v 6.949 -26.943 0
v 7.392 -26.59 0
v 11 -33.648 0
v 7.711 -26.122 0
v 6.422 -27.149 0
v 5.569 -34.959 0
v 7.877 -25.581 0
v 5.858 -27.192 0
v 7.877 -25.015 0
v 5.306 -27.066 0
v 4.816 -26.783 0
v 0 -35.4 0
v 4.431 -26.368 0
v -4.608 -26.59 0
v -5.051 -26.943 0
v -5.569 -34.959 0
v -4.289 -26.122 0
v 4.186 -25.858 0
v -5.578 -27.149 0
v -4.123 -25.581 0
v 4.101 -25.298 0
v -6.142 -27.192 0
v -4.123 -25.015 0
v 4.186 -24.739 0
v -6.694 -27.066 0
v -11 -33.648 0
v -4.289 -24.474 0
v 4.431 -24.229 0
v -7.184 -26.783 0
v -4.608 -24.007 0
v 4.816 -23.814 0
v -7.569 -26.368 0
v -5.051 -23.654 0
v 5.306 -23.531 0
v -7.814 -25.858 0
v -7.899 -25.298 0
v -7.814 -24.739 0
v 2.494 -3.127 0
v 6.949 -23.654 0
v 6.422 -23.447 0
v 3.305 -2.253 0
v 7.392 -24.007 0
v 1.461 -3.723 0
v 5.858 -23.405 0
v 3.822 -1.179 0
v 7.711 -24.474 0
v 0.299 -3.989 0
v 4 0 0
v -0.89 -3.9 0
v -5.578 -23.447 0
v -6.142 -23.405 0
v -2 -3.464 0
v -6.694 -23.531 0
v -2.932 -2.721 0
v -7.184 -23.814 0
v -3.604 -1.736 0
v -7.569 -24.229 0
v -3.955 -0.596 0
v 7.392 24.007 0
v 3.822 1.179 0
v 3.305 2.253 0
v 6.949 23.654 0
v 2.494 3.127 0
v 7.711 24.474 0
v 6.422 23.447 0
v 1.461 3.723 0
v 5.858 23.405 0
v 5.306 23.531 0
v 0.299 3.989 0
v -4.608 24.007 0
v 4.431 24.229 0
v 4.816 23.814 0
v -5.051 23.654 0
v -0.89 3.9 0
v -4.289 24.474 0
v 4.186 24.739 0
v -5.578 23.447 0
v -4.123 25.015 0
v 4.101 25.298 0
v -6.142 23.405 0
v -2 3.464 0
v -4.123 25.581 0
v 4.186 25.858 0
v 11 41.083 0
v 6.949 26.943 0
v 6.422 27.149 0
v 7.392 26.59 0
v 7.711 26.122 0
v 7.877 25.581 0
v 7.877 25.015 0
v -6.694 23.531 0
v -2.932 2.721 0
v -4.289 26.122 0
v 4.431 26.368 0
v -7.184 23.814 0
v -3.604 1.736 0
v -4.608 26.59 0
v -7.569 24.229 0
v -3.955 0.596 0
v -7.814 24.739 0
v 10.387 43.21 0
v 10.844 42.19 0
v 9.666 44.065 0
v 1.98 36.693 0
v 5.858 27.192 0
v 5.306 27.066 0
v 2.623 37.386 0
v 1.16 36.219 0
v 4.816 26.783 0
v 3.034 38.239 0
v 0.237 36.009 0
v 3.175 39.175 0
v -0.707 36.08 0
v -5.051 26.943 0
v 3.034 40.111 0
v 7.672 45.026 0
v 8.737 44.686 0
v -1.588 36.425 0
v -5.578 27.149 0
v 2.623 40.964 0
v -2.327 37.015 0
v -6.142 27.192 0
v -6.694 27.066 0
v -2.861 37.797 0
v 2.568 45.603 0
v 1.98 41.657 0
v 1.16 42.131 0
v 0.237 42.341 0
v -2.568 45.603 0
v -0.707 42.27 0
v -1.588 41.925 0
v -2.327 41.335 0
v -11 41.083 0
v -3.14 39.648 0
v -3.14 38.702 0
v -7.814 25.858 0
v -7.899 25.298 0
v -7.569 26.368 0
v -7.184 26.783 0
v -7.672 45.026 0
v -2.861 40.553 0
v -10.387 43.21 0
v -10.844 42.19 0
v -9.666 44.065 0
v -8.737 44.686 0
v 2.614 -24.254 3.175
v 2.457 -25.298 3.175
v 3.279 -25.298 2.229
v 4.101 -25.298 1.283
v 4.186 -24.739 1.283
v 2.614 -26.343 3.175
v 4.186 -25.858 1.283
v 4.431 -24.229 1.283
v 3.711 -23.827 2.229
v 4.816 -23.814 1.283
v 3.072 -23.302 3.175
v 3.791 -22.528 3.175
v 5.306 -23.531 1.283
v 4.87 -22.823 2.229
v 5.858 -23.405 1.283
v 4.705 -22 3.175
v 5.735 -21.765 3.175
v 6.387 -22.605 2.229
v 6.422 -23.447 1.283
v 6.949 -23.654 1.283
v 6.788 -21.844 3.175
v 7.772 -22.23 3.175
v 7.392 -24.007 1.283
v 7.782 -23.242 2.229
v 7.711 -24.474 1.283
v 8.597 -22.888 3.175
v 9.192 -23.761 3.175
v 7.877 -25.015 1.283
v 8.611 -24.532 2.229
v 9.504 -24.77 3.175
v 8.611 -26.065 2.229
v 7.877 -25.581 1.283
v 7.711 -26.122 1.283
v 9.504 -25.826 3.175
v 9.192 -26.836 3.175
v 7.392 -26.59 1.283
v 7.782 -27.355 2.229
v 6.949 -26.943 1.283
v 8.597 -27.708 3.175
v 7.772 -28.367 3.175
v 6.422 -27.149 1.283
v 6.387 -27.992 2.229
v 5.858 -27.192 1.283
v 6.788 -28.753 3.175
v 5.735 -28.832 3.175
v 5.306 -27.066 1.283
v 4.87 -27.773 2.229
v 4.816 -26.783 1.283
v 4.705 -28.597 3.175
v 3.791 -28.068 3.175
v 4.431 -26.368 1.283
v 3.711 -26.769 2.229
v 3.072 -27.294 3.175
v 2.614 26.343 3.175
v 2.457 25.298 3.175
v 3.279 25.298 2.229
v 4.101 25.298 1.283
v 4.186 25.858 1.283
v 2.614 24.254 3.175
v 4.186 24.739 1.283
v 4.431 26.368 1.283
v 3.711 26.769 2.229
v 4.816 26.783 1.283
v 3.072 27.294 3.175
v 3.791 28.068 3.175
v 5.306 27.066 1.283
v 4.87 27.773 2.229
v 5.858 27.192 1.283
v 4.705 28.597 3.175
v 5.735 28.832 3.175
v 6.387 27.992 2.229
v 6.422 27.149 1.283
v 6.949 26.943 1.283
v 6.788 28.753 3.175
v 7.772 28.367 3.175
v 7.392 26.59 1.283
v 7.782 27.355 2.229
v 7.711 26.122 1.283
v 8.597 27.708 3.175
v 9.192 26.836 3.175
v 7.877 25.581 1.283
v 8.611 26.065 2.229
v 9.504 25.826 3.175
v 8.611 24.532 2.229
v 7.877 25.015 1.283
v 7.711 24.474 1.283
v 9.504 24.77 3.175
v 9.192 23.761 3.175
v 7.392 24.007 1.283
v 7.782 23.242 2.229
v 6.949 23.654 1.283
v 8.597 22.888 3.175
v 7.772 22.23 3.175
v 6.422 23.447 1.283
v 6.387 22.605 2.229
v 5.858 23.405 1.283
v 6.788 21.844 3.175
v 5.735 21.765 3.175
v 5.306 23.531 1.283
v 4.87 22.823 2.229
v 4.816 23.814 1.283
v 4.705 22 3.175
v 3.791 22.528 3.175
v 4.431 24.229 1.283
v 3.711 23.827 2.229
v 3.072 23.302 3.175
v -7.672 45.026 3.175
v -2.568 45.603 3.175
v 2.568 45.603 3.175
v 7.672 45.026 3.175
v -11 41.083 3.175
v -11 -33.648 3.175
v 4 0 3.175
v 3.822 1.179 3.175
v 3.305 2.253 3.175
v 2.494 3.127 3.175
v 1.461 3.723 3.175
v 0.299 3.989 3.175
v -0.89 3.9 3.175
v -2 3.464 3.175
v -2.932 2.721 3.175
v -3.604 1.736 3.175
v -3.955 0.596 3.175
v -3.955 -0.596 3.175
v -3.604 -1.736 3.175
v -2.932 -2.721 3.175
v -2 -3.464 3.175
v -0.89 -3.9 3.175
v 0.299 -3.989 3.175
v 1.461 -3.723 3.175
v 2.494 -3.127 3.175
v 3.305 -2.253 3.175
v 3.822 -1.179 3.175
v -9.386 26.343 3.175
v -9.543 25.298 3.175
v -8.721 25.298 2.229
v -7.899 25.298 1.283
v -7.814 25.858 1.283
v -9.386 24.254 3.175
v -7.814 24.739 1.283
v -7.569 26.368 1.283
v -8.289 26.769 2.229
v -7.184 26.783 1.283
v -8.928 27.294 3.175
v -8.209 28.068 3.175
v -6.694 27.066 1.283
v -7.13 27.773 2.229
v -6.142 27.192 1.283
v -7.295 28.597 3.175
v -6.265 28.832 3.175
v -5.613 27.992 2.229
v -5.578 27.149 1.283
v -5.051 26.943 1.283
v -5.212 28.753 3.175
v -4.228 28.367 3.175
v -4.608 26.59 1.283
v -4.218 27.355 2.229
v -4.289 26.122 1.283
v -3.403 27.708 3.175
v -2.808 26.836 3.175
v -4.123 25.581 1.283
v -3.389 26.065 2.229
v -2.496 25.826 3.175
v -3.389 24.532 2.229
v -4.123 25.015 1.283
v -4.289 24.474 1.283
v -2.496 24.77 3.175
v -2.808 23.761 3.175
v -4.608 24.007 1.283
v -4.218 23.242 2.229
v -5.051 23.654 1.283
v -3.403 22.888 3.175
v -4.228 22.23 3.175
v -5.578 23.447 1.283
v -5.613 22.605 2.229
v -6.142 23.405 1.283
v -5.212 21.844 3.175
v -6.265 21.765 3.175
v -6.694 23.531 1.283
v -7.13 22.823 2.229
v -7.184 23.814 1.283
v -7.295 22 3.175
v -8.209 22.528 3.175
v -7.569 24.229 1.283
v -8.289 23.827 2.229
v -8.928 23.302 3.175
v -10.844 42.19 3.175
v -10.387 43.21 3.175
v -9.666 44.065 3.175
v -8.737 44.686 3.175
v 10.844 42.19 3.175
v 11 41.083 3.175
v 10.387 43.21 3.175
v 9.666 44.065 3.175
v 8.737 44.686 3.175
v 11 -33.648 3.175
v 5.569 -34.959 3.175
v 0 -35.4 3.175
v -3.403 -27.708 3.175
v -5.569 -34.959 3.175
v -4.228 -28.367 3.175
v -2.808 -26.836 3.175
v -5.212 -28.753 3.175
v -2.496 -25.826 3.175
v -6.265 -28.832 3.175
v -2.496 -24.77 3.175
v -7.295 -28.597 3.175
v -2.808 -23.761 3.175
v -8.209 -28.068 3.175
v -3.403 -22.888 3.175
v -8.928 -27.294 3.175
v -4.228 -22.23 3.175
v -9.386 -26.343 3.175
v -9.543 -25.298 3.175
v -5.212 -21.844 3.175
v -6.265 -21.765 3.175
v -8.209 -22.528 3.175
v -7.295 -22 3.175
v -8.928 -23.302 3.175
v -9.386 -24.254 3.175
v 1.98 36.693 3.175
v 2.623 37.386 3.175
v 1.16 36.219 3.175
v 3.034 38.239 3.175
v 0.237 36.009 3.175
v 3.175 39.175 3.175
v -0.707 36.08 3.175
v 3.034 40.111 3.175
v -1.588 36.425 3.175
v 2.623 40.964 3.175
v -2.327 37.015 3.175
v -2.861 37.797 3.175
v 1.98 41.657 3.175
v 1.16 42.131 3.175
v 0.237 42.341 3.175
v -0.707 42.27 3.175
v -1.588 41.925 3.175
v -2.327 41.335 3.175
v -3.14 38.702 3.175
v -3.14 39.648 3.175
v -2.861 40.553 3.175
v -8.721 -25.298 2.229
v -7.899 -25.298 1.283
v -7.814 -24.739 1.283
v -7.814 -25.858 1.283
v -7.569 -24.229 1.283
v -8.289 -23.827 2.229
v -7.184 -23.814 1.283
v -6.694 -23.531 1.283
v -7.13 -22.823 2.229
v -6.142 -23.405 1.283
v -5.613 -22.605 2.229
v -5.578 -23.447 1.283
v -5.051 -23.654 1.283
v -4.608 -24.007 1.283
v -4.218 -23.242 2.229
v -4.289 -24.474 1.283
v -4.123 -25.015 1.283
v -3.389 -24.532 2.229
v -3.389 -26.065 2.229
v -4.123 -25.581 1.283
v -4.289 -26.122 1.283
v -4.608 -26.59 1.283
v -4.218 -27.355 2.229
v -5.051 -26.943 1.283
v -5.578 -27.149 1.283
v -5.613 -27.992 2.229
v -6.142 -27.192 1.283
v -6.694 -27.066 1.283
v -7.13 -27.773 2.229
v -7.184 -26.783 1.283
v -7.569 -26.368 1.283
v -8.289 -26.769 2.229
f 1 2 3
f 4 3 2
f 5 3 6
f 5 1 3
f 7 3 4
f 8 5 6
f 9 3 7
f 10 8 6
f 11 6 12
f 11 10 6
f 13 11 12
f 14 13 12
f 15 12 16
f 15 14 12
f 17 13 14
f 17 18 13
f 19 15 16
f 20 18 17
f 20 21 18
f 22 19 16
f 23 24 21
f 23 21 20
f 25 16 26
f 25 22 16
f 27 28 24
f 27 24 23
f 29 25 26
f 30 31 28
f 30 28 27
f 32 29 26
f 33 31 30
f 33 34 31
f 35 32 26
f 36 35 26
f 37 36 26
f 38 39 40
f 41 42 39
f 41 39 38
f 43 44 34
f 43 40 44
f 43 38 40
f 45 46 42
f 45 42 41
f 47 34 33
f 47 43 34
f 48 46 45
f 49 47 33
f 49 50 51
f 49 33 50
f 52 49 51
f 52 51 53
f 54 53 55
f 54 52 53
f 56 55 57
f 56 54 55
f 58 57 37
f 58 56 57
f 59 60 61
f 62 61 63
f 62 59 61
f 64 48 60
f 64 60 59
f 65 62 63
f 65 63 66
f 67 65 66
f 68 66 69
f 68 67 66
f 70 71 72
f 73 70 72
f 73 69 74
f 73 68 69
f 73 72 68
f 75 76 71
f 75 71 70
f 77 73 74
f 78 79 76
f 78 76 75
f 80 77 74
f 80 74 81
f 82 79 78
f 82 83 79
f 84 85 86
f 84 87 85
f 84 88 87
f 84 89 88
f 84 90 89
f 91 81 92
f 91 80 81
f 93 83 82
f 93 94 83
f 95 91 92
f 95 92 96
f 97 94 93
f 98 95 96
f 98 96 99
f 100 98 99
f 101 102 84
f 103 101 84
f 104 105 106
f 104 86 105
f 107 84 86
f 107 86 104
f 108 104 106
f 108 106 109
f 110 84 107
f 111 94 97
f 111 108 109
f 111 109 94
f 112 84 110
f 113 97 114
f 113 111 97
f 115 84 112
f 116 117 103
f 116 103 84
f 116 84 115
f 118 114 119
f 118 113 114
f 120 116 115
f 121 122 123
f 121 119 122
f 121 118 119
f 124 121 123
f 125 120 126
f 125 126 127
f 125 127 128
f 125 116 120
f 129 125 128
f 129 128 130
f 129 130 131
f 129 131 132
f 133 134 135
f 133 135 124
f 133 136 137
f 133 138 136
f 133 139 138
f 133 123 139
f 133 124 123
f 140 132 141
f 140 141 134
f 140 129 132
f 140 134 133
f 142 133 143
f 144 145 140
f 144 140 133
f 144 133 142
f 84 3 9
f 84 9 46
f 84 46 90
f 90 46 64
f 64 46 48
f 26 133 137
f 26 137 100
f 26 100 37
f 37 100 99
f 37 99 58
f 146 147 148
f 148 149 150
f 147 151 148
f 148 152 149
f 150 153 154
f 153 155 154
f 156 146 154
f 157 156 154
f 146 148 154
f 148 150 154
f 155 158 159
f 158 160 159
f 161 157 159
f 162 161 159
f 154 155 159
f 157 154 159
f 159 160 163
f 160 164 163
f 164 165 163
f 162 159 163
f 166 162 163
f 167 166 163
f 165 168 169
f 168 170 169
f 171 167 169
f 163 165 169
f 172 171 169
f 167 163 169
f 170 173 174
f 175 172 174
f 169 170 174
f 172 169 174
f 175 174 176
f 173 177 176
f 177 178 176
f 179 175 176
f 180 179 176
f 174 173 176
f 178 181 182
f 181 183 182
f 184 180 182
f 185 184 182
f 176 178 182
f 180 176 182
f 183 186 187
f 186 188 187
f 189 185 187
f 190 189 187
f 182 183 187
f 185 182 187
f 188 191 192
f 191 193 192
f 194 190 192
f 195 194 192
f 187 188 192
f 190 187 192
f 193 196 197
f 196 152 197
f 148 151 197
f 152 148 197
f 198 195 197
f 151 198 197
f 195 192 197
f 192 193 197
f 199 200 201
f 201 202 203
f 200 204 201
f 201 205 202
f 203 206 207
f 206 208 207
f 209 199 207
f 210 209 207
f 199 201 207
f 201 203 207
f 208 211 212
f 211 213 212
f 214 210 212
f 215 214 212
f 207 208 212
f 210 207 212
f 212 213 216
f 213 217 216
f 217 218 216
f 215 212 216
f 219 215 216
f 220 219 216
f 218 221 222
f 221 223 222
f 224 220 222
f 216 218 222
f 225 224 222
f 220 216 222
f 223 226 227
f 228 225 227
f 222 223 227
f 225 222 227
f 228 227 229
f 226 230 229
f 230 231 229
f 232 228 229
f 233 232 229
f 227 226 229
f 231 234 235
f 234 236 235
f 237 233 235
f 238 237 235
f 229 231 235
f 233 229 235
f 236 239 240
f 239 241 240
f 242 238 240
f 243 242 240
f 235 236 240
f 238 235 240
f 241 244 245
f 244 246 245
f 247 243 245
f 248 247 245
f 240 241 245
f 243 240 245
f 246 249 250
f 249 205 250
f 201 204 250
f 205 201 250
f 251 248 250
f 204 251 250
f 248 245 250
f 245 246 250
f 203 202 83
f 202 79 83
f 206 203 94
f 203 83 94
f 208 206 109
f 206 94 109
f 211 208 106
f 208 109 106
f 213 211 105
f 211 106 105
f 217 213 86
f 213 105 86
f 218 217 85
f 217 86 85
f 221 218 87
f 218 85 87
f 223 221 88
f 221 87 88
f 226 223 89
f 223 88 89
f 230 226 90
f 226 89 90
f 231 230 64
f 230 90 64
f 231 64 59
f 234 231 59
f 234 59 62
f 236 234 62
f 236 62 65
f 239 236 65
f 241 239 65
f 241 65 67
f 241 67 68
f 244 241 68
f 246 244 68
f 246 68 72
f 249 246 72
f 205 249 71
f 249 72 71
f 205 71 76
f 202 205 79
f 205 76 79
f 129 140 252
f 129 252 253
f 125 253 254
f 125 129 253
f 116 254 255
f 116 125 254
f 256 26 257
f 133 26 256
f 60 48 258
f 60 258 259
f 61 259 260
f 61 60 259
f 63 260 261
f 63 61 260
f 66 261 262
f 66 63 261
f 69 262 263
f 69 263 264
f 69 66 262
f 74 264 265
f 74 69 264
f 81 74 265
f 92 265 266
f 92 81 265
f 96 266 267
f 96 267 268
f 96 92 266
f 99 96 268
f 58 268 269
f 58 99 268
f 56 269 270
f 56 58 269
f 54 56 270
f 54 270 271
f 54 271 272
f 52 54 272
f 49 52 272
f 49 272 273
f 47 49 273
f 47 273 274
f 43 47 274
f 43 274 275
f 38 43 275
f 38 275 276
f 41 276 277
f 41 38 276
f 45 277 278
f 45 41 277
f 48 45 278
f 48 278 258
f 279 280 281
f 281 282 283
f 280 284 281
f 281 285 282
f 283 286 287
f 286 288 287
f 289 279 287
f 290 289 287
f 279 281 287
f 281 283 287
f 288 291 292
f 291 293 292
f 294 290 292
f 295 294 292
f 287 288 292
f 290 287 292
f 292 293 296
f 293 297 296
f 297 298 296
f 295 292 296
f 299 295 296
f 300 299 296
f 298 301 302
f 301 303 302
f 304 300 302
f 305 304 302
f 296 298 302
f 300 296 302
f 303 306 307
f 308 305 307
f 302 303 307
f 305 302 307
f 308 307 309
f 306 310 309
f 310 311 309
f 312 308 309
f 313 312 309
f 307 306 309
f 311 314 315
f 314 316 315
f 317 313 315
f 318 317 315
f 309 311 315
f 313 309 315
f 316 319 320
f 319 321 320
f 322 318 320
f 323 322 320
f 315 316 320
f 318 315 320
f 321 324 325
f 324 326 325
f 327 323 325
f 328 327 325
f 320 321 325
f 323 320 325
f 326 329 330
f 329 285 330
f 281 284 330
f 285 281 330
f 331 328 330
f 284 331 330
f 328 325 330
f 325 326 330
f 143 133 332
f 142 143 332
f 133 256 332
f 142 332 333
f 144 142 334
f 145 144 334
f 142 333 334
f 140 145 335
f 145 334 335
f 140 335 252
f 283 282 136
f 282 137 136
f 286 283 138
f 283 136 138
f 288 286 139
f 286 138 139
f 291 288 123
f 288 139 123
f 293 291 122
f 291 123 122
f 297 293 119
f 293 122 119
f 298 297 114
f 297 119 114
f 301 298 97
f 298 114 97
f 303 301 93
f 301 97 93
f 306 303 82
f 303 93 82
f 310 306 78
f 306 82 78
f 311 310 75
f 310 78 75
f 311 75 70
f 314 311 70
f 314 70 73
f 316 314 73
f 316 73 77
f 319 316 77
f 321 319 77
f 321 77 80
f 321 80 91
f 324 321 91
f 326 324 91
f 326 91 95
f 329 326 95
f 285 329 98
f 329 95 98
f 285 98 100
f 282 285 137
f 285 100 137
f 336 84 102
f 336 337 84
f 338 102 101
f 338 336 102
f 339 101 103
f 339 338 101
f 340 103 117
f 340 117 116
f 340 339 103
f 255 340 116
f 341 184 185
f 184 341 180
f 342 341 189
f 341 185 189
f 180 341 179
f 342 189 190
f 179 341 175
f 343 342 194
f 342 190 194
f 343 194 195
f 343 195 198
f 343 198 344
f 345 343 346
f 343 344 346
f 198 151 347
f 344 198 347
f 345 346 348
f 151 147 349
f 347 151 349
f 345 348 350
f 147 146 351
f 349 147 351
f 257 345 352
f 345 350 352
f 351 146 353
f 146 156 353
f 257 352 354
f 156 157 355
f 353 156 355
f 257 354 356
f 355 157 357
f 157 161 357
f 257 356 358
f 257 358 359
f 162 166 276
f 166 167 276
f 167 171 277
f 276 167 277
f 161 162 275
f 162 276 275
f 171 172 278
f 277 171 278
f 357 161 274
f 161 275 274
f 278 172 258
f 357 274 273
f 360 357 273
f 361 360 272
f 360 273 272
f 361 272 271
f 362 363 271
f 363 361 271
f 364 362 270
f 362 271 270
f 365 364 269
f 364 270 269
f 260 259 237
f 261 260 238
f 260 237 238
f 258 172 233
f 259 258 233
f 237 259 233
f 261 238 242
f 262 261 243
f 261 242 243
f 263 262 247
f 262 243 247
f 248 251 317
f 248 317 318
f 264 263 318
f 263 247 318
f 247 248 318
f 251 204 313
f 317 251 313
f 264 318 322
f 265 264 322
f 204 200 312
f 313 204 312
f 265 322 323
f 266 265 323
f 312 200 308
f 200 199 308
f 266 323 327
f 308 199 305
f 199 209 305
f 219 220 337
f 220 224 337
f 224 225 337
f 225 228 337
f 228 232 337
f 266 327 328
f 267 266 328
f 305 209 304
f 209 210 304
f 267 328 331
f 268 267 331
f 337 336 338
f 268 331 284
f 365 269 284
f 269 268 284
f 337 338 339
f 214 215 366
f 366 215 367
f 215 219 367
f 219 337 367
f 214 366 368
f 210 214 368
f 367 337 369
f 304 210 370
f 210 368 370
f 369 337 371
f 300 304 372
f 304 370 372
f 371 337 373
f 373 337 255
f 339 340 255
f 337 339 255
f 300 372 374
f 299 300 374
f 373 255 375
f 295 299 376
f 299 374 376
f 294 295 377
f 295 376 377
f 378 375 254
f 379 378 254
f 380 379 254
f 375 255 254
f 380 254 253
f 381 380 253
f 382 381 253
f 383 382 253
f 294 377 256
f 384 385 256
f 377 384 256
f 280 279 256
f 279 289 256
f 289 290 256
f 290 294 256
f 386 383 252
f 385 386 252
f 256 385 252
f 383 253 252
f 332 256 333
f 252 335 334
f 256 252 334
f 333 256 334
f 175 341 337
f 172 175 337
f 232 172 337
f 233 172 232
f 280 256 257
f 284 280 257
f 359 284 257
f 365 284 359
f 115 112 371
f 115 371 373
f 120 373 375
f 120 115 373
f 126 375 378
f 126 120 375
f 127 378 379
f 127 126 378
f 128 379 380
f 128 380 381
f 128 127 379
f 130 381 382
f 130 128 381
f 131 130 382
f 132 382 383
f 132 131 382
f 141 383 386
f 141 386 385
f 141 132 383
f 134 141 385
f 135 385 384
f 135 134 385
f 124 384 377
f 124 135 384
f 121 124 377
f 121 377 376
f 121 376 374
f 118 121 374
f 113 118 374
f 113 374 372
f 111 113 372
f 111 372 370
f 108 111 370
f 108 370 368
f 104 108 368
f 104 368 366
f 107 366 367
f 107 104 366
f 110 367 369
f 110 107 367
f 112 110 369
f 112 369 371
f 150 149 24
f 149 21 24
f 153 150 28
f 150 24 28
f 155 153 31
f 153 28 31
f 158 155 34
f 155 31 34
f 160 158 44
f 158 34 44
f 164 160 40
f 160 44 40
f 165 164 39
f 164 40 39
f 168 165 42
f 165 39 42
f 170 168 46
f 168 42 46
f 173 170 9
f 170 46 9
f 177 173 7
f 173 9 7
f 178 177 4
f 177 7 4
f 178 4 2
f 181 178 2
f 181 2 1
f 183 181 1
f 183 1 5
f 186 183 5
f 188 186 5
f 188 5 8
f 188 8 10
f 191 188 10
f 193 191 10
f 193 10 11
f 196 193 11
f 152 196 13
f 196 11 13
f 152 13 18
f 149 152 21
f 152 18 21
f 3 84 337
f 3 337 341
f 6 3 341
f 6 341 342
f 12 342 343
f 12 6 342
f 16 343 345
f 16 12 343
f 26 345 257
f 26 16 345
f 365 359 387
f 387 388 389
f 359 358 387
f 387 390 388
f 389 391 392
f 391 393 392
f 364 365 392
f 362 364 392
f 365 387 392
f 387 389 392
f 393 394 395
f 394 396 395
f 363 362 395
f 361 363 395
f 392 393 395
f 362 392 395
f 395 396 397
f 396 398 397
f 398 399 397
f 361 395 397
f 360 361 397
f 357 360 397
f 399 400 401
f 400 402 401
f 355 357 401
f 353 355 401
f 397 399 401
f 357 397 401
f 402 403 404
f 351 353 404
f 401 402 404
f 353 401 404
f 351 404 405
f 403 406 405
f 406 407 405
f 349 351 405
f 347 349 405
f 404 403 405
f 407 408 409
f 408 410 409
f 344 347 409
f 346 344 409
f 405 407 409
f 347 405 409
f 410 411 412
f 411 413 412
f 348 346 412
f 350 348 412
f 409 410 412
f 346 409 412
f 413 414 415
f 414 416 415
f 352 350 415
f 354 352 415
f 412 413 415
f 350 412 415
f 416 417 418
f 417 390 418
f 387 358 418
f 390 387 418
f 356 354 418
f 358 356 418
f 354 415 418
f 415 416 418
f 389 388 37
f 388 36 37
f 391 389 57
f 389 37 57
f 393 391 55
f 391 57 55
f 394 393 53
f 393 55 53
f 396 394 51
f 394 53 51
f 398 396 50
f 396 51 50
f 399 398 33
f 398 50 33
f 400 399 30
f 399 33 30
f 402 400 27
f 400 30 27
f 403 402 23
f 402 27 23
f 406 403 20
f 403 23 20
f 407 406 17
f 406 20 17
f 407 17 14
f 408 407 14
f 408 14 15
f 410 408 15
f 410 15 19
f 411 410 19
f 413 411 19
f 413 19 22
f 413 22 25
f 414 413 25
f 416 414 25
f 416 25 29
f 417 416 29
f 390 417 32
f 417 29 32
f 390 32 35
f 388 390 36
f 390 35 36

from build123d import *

# Parameters (mm, degrees)
SKETCH1_R                                      = 4
SKETCH1_R_2                                    = 3.175
BOSS_EXTRUDE1_DEPTH                            = 3.175
CSK_FOR_6_FLAT_HEAD_MACHINE_SCREW1_D           = 3.7973
CSK_FOR_6_FLAT_HEAD_MACHINE_SCREW1_DEPTH       = 10.973
CSK_FOR_6_FLAT_HEAD_MACHINE_SCREW1_CSINK_D     = 7.0866
CSK_FOR_6_FLAT_HEAD_MACHINE_SCREW1_CSINK_ANGLE = 82
CSK_FOR_6_FLAT_HEAD_MACHINE_SCREW1_TIP         = 1.140824014
FILLET1_R                                      = 4


with BuildPart() as part:
    # Sketch1 → Boss-Extrude1 (new body)
    with BuildSketch(Plane.XY):
        with BuildLine():
            Line((11, 44.330639799), (11, -33.647585352))
            ThreePointArc((11, -33.647585352), (0, -35.4), (-11, -33.647585352))
            Line((-11, -33.647585352), (-11, 44.330639799))
            ThreePointArc((-11, 44.330639799), (0, 45.675), (11, 44.330639799))
        make_face()
        Circle(SKETCH1_R, mode=Mode.SUBTRACT)
        with Locations((0, 39.175)):
            Circle(SKETCH1_R_2, mode=Mode.SUBTRACT)
    extrude(amount=BOSS_EXTRUDE1_DEPTH)

    # CSK for #6 Flat Head Machine Screw1
    with Locations(Plane.XY.offset(3.175)):
        with Locations((-6, 25.298221281), (-6, -25.298221281), (6, 25.298221281), (6, -25.298221281)):
            CounterSinkHole(CSK_FOR_6_FLAT_HEAD_MACHINE_SCREW1_D / 2, CSK_FOR_6_FLAT_HEAD_MACHINE_SCREW1_CSINK_D / 2, depth=CSK_FOR_6_FLAT_HEAD_MACHINE_SCREW1_DEPTH, counter_sink_angle=CSK_FOR_6_FLAT_HEAD_MACHINE_SCREW1_CSINK_ANGLE)
            with Locations((0, 0, -(CSK_FOR_6_FLAT_HEAD_MACHINE_SCREW1_DEPTH + CSK_FOR_6_FLAT_HEAD_MACHINE_SCREW1_TIP / 2))):  # 118° drill point
                Cone(0, CSK_FOR_6_FLAT_HEAD_MACHINE_SCREW1_D / 2, CSK_FOR_6_FLAT_HEAD_MACHINE_SCREW1_TIP, mode=Mode.SUBTRACT)

    # Fillet1
    fillet1_edges = [part.edges().sort_by_distance(p)[0] for p in [
        (11, 44.330639799, 1.5875),
        (-11, 44.330639799, 1.5875),
    ]]
    fillet(fillet1_edges, radius=FILLET1_R)


solid = part.part
